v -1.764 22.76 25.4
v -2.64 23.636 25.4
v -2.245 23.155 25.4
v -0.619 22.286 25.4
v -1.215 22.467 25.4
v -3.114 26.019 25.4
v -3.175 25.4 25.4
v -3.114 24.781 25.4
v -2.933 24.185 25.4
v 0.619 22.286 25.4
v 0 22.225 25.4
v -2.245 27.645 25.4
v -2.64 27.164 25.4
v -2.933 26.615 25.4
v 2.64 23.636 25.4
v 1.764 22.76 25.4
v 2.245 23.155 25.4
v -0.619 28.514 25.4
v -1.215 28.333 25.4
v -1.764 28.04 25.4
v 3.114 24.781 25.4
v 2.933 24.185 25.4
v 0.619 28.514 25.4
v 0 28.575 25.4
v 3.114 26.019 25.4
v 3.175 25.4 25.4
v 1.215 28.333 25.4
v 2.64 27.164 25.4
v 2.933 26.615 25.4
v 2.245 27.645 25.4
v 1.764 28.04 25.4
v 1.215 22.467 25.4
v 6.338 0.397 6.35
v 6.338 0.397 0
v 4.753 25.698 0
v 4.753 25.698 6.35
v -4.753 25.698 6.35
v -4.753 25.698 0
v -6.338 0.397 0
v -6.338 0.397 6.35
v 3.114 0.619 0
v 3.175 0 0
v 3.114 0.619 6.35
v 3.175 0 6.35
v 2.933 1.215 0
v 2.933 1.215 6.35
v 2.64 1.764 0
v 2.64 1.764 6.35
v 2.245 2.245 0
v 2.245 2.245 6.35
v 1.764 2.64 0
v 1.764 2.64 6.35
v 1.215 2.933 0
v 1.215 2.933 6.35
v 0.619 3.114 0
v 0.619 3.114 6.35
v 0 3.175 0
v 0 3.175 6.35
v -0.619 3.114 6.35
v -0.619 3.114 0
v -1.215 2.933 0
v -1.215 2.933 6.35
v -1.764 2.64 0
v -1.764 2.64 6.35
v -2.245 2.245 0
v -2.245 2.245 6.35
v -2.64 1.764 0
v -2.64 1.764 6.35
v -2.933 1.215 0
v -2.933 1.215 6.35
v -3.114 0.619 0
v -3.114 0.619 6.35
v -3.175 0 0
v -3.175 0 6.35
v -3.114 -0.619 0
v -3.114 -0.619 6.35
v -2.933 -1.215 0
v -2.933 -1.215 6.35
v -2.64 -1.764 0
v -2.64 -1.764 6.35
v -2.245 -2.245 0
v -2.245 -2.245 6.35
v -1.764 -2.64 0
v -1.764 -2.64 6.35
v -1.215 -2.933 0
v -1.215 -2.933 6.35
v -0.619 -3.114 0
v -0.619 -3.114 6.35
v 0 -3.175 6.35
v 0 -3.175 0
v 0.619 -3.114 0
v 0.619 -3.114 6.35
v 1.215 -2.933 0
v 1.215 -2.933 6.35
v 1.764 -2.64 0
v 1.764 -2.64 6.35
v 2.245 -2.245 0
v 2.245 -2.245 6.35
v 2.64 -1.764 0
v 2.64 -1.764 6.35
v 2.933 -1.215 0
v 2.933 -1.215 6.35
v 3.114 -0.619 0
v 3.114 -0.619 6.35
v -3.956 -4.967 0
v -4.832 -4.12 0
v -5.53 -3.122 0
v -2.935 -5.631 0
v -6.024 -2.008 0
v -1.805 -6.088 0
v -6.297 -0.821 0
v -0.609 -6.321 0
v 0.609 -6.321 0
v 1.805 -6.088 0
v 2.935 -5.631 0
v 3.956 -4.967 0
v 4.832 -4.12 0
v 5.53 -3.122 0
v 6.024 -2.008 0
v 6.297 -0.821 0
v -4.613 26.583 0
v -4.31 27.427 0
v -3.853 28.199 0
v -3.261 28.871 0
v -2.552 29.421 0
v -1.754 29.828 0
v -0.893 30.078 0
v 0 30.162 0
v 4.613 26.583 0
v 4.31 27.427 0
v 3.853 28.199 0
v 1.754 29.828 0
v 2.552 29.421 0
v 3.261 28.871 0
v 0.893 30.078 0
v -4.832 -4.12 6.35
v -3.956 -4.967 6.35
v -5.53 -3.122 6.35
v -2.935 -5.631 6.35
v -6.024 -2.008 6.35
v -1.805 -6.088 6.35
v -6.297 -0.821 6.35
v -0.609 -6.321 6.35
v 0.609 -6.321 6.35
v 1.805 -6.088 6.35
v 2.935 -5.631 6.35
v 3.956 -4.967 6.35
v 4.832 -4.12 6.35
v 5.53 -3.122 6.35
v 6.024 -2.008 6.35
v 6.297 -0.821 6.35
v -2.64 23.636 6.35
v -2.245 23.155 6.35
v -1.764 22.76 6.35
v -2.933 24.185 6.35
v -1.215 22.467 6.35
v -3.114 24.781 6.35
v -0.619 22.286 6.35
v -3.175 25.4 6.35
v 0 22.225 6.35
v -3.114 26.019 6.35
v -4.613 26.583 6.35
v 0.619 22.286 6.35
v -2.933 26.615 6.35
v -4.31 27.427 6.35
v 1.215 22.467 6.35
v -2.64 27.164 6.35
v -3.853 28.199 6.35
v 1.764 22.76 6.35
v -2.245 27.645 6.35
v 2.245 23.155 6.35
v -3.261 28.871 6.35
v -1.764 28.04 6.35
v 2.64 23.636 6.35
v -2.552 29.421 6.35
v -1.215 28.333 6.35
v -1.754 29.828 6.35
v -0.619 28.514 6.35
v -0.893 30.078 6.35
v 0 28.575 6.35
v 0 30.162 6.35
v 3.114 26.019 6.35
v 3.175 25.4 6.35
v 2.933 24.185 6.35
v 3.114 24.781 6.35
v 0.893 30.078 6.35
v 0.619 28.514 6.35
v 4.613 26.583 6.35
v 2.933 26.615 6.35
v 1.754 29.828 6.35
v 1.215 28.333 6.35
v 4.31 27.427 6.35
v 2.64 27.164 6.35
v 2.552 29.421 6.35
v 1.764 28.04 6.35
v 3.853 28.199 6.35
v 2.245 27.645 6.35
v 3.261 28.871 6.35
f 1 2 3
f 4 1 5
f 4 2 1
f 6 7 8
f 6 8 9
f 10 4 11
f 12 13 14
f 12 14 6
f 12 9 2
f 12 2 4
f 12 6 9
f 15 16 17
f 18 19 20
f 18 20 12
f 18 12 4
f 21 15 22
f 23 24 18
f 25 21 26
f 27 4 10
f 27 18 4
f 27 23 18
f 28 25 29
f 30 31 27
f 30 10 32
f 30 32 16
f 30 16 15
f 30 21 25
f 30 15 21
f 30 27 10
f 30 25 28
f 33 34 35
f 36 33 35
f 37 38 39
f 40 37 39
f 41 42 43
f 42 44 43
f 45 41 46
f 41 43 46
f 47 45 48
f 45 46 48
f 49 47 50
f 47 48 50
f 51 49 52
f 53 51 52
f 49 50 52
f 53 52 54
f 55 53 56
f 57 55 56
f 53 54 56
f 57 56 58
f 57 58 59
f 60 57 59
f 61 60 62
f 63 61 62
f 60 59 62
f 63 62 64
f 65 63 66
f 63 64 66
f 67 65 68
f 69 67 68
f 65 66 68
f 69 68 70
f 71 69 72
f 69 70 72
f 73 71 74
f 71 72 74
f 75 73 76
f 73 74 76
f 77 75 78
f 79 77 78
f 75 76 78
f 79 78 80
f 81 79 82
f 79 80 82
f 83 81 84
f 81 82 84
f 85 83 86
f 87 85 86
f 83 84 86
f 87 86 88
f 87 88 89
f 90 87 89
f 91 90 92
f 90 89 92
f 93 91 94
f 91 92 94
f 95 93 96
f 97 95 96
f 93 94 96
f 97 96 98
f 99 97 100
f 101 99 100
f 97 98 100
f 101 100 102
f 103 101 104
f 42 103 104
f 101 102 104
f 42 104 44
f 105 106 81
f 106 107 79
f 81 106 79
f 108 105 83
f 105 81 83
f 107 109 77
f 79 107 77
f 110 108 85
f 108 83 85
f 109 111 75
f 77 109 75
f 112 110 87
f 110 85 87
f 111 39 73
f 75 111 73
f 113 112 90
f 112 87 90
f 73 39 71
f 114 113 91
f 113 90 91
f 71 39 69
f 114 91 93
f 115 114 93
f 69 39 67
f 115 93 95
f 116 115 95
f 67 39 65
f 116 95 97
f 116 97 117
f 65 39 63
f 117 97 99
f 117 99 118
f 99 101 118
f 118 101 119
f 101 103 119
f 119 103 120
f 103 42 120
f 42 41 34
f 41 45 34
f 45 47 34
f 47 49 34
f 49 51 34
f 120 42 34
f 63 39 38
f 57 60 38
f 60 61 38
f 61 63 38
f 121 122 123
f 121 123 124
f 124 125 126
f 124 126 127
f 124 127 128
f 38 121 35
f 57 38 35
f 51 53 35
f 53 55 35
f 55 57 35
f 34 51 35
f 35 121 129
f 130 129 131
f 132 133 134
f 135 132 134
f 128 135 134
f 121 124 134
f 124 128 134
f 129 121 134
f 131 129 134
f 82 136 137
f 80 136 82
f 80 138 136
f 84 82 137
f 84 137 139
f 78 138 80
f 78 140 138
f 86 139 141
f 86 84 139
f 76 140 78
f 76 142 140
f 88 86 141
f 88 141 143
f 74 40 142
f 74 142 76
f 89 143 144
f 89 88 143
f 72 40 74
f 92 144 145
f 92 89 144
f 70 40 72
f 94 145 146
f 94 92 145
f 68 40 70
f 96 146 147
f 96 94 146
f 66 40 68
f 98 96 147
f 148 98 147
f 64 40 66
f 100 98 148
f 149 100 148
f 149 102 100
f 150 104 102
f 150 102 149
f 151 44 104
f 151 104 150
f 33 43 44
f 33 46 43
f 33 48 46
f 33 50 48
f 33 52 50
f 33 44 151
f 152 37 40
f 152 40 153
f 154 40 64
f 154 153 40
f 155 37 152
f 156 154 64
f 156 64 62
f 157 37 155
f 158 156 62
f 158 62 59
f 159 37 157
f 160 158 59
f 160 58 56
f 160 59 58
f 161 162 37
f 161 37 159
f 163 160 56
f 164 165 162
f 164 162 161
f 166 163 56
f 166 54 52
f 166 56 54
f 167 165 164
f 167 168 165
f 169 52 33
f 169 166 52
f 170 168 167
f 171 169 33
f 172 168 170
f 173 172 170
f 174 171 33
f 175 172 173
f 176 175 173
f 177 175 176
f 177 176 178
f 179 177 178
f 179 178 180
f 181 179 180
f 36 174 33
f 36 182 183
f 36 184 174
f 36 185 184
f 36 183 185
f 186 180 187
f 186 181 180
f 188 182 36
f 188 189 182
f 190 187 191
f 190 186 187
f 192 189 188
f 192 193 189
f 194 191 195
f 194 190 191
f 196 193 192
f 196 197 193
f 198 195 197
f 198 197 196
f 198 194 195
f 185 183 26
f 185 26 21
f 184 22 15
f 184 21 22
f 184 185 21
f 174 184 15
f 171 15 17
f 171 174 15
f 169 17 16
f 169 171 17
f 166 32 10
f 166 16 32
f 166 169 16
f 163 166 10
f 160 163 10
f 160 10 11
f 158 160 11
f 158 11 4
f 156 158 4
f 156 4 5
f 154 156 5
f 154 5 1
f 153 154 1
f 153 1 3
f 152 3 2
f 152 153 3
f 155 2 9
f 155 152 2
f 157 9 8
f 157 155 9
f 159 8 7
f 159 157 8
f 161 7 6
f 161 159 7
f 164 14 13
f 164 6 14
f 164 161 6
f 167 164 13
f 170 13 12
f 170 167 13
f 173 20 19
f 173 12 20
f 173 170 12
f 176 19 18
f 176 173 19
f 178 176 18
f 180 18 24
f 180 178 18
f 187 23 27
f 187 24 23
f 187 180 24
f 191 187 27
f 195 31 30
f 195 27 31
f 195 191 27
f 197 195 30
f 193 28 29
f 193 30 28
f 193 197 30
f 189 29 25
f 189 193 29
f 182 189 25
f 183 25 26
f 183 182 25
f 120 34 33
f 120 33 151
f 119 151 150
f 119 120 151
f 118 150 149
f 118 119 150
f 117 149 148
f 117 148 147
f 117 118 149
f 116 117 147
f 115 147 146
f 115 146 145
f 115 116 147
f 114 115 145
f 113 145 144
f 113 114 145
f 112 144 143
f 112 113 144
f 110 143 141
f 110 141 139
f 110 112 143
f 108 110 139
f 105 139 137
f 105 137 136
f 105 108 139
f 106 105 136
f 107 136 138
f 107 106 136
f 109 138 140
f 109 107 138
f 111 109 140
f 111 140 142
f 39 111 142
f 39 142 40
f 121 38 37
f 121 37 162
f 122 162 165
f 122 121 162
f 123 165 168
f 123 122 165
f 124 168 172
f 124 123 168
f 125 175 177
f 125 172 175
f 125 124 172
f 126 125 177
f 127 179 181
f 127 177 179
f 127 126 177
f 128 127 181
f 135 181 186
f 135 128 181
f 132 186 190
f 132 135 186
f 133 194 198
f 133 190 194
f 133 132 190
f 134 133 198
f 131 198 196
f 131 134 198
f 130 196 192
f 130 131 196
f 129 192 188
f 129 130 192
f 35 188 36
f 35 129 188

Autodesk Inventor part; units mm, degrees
ref_plane "YZ Plane" through (0, 0, 0) normal (1, 0, 0) x (0, 1, 0)
ref_plane "XZ Plane" through (0, 0, 0) normal (0, 1, 0) x (-1, 0, 0)
ref_plane "XY Plane" through (0, 0, 0) normal (0, 0, 1) x (1, 0, 0)
sketch "Sketch1" plane through (0, 0, 0) normal (0, 0, 1) x (1, 0, 0)
  circle A0 centre (0, 0) radius 6.35
  circle A1 centre (0, 25.4) radius 4.7625
  line L0 (0, 25.4) -> (0, 0)
  line L1 (-4.7532, 25.6977) -> (-6.3376, 0.3969)
  line L2 (6.3376, 0.3969) -> (4.7532, 25.6977)
  dimension "d0" = 12.7
  dimension "d1" = 9.525
  dimension "d2" = 25.4
extrude "Extrusion1" add sketch "Sketch1" along normal blind 6.35
sketch "Sketch2" plane through (0, 0, 6.35) normal (0, 0, 1) x (1, 0, 0)
  arc A0 (-6.3376, 0.3969) -> (6.3376, 0.3969) centre (0, 0) ccw projected
  circle A1 centre (0, 0) radius 3.175
  dimension "d5" = 6.35
extrude "Extrusion2" cut sketch "Sketch2" against normal through all
sketch "Sketch3" plane through (0, 0, 6.35) normal (0, 0, 1) x (1, 0, 0)
  arc A0 (4.7532, 25.6977) -> (-4.7532, 25.6977) centre (0, 25.4) ccw projected
  circle A1 centre (0, 25.4) radius 3.175
  dimension "d8" = 6.35
extrude "Extrusion3" add sketch "Sketch3" along normal blind 19.05
properties part number "Crank Handle" material "PPS Plastic"
